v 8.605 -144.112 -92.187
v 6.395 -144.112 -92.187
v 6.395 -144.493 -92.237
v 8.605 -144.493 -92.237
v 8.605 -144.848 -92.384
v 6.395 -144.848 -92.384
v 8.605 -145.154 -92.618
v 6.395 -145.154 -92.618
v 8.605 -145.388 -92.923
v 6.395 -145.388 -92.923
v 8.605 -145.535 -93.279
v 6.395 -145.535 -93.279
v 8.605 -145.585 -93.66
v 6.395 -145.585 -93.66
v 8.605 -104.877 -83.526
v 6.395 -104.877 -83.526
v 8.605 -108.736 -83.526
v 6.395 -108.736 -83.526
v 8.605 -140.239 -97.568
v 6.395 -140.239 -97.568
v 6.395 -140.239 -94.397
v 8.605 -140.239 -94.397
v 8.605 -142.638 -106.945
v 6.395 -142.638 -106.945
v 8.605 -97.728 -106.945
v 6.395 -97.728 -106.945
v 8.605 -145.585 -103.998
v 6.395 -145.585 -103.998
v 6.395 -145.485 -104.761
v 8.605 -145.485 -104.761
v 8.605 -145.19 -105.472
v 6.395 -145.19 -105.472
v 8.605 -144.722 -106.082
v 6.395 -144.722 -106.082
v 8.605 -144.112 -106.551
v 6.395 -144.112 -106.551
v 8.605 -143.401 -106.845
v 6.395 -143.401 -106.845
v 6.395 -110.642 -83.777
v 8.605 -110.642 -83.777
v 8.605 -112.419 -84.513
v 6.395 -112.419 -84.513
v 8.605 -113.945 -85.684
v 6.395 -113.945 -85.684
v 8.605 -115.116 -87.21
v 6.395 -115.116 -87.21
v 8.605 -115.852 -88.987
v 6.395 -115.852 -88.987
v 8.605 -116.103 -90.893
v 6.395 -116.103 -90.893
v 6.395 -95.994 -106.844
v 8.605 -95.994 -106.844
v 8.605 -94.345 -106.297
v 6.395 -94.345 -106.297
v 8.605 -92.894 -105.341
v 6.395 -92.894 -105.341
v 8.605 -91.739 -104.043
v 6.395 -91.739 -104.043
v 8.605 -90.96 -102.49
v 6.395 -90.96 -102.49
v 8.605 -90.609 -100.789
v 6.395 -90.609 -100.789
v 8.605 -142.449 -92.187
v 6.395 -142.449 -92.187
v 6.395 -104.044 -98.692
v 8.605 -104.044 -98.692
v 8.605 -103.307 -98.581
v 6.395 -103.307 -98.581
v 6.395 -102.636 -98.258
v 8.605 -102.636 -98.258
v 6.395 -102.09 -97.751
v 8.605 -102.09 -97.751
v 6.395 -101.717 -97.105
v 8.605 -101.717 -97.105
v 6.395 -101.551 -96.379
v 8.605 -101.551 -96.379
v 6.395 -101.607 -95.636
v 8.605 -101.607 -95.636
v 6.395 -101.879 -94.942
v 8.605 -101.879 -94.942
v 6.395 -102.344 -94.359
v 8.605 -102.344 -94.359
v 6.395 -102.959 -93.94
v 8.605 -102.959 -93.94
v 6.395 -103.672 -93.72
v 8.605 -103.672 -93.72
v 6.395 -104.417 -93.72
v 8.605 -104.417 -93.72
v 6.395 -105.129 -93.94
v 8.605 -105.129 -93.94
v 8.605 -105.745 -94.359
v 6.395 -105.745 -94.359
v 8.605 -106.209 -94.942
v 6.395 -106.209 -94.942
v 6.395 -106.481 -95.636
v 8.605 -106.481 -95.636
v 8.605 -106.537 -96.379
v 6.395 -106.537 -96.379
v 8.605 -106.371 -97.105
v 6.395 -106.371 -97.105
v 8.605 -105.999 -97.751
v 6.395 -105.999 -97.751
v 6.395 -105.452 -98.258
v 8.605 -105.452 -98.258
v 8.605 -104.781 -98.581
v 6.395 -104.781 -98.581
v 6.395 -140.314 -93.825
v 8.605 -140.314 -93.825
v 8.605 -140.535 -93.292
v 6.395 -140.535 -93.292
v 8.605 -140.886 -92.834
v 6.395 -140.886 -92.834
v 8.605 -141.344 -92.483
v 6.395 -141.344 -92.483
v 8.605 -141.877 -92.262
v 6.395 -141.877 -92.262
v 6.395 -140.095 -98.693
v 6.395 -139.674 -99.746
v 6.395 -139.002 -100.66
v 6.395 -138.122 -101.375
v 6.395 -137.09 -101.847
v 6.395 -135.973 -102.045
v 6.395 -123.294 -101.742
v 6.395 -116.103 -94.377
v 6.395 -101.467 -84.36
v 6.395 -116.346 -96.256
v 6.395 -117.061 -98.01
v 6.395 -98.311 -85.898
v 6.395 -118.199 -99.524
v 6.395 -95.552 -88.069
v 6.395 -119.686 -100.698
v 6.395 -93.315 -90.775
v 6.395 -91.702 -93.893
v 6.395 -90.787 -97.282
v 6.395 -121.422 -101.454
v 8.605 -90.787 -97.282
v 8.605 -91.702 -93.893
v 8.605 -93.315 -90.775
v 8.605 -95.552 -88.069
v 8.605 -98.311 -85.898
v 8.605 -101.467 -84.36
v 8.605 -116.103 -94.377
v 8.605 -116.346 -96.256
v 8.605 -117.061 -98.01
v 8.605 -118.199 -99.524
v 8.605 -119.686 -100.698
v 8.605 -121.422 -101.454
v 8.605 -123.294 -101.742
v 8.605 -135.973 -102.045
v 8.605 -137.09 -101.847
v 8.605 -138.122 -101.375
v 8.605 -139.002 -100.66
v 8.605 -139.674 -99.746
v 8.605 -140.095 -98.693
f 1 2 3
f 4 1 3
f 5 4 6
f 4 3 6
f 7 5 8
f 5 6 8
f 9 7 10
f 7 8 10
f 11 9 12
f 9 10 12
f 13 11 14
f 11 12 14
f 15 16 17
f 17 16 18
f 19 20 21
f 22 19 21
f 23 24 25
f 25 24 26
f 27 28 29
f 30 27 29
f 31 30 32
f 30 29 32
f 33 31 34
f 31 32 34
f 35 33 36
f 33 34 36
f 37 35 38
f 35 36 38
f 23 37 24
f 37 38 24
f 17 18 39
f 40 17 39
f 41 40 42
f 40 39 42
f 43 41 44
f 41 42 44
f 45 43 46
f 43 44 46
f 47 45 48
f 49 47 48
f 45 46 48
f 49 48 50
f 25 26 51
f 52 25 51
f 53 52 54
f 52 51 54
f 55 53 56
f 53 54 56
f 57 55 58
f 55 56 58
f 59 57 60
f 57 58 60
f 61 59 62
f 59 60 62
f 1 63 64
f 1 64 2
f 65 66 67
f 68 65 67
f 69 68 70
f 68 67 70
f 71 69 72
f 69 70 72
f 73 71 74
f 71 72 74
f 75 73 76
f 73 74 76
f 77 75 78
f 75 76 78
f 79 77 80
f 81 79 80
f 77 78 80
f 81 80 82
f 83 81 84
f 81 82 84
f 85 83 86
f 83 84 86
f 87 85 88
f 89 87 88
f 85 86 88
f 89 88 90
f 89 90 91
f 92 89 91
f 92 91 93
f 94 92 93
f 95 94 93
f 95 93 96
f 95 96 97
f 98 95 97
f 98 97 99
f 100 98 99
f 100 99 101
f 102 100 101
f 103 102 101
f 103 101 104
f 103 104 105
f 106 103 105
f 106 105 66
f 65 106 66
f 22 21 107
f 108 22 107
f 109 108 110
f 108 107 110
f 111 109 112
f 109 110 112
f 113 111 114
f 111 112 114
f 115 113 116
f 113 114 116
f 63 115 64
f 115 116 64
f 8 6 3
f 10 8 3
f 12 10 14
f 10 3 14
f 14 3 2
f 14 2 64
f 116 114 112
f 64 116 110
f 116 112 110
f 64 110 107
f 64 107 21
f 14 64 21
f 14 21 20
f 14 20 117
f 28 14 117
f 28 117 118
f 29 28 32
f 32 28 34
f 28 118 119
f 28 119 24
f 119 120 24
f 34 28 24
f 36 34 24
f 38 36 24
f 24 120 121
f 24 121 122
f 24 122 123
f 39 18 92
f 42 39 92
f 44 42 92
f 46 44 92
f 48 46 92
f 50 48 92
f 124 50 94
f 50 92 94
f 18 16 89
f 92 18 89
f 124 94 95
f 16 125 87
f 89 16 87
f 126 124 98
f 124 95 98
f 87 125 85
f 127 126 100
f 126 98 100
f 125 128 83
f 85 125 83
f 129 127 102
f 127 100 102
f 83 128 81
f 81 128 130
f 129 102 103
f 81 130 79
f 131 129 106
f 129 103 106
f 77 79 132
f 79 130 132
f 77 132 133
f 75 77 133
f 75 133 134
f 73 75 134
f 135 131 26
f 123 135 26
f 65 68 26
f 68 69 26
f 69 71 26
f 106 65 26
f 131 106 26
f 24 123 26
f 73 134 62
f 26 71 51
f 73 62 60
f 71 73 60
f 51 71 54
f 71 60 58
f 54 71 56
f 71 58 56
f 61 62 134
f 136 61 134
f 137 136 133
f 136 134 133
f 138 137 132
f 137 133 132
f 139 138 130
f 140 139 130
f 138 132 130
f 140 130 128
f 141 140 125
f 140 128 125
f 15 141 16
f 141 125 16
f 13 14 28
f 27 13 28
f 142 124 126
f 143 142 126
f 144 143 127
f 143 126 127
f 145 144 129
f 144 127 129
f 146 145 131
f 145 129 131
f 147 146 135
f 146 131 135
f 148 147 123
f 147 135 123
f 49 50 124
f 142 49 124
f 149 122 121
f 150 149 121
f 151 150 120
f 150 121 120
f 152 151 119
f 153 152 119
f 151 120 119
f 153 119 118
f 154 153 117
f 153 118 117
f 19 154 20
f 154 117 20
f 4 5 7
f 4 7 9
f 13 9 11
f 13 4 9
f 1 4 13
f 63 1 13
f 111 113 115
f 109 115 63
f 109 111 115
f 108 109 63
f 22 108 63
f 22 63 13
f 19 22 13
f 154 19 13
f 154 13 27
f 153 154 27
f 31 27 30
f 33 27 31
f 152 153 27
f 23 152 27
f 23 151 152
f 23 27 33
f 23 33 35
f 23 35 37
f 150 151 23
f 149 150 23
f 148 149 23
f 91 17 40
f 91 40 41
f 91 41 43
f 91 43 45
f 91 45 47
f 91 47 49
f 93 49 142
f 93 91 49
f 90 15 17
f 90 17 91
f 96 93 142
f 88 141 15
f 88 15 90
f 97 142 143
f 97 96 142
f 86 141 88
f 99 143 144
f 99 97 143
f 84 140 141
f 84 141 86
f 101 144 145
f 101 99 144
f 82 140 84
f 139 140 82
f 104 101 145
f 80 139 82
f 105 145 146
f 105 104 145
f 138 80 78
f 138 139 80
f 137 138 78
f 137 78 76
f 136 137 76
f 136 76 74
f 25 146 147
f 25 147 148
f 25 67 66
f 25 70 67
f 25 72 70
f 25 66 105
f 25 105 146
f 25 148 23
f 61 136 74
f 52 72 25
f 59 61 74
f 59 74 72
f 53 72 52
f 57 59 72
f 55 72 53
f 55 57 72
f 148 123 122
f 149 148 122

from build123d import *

# Parameters (mm, degrees)
BOSS_EXTRUDE1_DEPTH = 15
SCALE1_SCALE        = 0.147347741
CUT_EXTRUDE1_REACH  = 182.668
SKETCH4_R           = 2.5


with BuildPart() as part:
    # Sketch3 → Boss-Extrude1 (new body)
    with BuildSketch(Plane(origin=(0, 0, 0), x_dir=(0, 0, -1), z_dir=(1, 0, 0))):
        with BuildLine():
            Line((0, -60), (0, -86.184781703))
            ThreePointArc((0, -86.184781703), (14.644660941, -121.540120762), (50, -136.184781703))
            Line((50, -136.184781703), (73.642909299, -136.184781703))
            ThreePointArc((73.642909299, -136.184781703), (108.573727492, -150.409958986), (123.628662427, -184.991264087))
            Line((123.628662427, -184.991264087), (125.683202704, -271.037537481))
            ThreePointArc((125.683202704, -271.037537481), (116.280768167, -291.592024429), (95.295179386, -299.98831959))
            Line((95.295179386, -299.98831959), (73.775693132, -299.98831959))
            ThreePointArc((73.775693132, -299.98831959), (63.169091414, -304.381717872), (58.775693132, -314.98831959))
            Line((58.775693132, -314.98831959), (58.775693132, -326.270417599))
            ThreePointArc((58.775693132, -326.270417599), (61.70462532, -333.341485411), (68.775693132, -336.270417599))
            Line((68.775693132, -336.270417599), (117.262564818, -336.270417599))
            Line((117.262564818, -336.270417599), (138.939006392, -336.270417599))
            ThreePointArc((138.939006392, -336.270417599), (153.081142016, -330.412553223), (158.939006392, -316.270417599))
            Line((158.939006392, -316.270417599), (158.939006392, -146.184781703))
            Line((158.939006392, -146.184781703), (158.939006392, -50))
            Line((158.939006392, -50), (158.939006392, -11.480346054))
            ThreePointArc((158.939006392, -11.480346054), (148.053108697, 21.328755123), (117.156078712, 36.830801017))
            ThreePointArc((117.156078712, 36.830801017), (39.60735059, 11.368133348), (0, -60))
        make_face()
    extrude(amount=BOSS_EXTRUDE1_DEPTH)


with BuildPart() as part_1:
    # Scale1: scaled about (7.5, -112.632543916, -97.960281801)
    add(part.part.scale(SCALE1_SCALE).moved(Location((6.394891943, -96.036393007, -83.52605557))))

    # Sketch4 → Cut-Extrude1 (cut, up to next)
    with BuildSketch(Plane(origin=(8.605108057, 0, 0), x_dir=(0, 0, -1), z_dir=(1, 0, 0)), mode=Mode.PRIVATE) as cut_extrude1_sk1:
        with Locations((96.192054569, -104.044147658)):
            Circle(SKETCH4_R)
    cut_extrude1_tool1 = extrude(cut_extrude1_sk1.sketch, amount=-CUT_EXTRUDE1_REACH, mode=Mode.PRIVATE) & part_1.part
    add(cut_extrude1_tool1.solids().sort_by_distance((8.605108, -104.044148, -96.192055))[0], mode=Mode.SUBTRACT)


solid = part_1.part
